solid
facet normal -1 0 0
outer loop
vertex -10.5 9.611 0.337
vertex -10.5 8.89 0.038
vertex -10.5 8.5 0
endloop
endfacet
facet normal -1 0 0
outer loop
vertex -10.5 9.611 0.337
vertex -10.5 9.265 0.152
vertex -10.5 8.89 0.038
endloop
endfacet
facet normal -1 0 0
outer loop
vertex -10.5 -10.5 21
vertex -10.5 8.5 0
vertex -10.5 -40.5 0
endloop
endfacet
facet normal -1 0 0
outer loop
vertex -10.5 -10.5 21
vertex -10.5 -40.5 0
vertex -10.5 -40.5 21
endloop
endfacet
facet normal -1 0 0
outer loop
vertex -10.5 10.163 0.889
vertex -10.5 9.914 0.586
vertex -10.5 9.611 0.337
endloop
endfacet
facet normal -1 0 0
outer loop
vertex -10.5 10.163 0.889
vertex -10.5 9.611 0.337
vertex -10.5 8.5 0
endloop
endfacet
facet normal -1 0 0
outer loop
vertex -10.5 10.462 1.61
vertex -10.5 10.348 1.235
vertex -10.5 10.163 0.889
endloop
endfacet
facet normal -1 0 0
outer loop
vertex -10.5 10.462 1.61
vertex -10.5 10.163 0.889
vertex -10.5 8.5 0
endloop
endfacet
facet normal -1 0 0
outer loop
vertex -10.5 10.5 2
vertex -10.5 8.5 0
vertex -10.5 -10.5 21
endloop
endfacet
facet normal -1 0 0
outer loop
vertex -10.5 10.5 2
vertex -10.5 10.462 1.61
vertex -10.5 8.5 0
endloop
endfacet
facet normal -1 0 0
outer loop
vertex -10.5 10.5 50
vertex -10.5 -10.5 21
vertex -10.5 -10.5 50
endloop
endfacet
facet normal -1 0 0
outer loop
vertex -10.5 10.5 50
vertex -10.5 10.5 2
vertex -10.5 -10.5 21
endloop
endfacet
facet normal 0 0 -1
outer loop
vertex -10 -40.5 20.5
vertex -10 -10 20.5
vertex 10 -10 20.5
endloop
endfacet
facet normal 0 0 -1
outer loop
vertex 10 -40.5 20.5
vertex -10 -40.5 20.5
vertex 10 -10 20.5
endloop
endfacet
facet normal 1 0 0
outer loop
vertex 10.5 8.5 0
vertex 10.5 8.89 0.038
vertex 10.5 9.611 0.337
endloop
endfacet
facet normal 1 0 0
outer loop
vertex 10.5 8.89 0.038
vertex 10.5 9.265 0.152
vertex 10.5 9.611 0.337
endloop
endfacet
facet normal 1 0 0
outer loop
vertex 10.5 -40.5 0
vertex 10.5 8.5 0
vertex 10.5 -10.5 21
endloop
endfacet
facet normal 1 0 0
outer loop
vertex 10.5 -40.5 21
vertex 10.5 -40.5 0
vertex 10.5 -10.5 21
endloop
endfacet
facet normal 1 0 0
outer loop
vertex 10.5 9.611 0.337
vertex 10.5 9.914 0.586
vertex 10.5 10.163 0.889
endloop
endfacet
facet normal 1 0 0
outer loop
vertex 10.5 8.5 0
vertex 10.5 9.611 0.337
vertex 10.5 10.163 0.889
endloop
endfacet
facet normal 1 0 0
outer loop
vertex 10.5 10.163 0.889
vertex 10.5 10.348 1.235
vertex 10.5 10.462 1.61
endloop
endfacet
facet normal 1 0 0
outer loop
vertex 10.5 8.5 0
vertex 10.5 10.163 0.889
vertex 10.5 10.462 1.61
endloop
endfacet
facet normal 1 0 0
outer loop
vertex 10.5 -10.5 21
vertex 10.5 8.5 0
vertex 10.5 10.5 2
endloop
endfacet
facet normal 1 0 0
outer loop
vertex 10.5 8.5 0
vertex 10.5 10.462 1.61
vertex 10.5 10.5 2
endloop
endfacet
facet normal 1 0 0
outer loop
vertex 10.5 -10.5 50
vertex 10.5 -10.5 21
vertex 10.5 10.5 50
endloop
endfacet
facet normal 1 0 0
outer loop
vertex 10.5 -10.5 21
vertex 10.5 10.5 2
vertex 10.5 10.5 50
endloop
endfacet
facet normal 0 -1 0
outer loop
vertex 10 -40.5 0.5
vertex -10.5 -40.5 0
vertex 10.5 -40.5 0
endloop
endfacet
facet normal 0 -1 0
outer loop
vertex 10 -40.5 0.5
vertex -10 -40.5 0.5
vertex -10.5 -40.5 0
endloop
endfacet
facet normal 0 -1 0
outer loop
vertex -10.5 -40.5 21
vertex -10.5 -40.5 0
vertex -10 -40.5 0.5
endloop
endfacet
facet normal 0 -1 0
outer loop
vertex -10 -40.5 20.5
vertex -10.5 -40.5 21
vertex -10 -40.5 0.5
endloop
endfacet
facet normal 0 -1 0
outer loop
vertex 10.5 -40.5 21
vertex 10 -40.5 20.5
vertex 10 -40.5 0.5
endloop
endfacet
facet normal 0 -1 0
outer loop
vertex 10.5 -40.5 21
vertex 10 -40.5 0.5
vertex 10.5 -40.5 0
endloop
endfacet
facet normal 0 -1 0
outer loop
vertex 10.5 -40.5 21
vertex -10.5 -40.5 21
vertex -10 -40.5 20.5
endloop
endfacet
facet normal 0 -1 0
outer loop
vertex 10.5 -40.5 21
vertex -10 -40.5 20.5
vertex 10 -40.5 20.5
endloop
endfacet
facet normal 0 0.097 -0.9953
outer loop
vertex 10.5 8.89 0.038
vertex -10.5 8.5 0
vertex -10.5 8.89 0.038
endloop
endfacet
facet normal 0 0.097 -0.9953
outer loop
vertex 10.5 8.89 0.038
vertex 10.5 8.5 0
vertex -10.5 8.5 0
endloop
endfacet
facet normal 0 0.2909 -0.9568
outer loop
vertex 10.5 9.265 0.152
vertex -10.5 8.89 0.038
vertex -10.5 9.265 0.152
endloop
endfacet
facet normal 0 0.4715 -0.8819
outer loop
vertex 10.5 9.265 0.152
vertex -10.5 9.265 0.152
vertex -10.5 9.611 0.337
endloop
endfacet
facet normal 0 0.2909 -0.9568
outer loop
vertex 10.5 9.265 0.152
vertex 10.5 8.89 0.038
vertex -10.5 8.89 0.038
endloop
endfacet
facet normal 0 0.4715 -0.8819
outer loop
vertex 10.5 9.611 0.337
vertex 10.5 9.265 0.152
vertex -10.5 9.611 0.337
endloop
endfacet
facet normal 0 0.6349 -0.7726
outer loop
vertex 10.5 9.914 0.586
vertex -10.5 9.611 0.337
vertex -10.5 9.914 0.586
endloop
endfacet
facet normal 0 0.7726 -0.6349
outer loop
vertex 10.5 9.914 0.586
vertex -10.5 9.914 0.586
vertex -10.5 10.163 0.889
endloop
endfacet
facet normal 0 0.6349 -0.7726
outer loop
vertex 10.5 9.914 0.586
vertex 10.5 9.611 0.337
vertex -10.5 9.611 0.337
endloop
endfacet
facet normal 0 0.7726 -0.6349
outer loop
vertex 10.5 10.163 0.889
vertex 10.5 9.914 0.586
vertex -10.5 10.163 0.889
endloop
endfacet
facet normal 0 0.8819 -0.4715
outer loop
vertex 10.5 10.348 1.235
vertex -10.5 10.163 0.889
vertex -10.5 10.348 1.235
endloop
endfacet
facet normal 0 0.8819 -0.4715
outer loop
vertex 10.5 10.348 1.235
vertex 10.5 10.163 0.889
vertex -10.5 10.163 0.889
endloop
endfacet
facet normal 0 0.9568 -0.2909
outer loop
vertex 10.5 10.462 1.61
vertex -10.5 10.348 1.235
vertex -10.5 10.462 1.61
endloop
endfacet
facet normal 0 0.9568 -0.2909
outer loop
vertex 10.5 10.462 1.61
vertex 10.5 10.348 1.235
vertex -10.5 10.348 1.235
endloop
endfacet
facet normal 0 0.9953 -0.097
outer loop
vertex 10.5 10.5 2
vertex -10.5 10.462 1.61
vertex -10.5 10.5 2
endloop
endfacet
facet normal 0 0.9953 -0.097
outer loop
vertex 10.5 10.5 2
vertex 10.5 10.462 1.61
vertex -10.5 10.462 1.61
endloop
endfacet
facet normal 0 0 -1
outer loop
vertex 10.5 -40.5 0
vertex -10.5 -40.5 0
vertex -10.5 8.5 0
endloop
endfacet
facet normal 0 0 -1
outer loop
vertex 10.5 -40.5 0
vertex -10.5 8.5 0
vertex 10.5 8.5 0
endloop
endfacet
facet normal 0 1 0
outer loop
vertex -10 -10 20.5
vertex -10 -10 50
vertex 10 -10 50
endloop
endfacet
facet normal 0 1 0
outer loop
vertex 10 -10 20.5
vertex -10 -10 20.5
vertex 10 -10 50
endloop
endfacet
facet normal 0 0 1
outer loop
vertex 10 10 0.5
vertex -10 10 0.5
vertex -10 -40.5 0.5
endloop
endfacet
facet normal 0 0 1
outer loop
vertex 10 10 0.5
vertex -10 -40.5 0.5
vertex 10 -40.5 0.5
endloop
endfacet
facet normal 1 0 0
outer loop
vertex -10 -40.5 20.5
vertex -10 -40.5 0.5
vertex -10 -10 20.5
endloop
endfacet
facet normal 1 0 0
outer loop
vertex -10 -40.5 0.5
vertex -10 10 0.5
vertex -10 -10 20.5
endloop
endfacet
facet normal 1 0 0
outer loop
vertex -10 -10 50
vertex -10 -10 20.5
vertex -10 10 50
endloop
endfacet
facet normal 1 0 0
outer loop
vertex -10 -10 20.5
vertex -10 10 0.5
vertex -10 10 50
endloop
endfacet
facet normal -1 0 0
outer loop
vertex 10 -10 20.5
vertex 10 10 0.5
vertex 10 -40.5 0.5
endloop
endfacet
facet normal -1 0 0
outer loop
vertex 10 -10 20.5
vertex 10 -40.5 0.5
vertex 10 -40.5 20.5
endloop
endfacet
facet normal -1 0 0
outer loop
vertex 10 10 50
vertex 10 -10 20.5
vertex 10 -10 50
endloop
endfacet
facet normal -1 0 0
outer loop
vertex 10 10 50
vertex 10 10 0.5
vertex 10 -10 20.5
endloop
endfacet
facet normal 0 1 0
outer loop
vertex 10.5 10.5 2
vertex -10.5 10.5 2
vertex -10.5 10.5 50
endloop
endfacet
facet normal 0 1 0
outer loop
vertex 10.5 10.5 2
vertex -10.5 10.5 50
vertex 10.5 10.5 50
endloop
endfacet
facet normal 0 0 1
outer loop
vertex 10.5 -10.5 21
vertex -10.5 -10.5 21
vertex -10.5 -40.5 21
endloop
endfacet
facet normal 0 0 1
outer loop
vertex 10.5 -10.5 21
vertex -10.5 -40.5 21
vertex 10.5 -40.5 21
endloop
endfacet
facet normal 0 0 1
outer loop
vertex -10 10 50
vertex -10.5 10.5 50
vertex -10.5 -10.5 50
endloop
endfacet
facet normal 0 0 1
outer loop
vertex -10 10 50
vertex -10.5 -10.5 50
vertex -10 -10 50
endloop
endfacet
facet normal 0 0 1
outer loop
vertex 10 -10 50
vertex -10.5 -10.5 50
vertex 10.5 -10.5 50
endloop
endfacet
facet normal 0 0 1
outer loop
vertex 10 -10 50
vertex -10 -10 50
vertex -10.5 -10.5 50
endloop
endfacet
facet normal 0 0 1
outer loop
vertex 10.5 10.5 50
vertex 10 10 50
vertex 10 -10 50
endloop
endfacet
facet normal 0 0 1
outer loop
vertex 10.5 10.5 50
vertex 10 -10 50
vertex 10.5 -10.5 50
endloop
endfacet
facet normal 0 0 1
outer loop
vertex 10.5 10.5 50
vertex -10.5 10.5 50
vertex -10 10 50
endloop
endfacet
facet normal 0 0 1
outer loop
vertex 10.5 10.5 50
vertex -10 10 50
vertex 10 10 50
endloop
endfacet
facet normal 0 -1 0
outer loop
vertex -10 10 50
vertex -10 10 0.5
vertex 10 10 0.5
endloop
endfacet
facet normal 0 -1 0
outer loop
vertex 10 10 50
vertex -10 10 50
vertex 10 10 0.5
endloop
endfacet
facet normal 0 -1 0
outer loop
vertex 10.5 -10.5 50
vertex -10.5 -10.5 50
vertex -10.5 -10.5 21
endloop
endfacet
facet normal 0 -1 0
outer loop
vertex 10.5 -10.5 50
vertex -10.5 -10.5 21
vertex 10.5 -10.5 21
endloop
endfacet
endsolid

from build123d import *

# Parameters (mm, degrees)
ESQUISSE1_W        = 21
ESQUISSE1_H        = 21
BOSS_EXTRU_1_DEPTH = 50
ESQUISSE3_W        = 21
ESQUISSE3_H        = 21
BOSS_EXTRU_2_DEPTH = 30
COQUE1_T           = -0.5
CONG_1_R           = 2


with BuildPart() as part:
    # Esquisse1 → Boss.-Extru.1 (new body)
    with BuildSketch(Plane.XY):
        Rectangle(ESQUISSE1_W, ESQUISSE1_H)
    extrude(amount=BOSS_EXTRU_1_DEPTH)

    # Esquisse3 → Boss.-Extru.2 (add)
    with BuildSketch(Plane.XZ.offset(10.5)):
        with Locations((0, 10.5)):
            Rectangle(ESQUISSE3_W, ESQUISSE3_H)
    extrude(amount=BOSS_EXTRU_2_DEPTH)

    # Coque1
    coque1_openings = [part.faces().sort_by_distance(p)[0] for p in [
        (0, 0, 50),
        (0, -40.5, 10.5),
    ]]
    offset(amount=COQUE1_T, openings=coque1_openings, kind=Kind.INTERSECTION)

    # Congé1
    cong_1_edges = [part.edges().sort_by_distance(p)[0] for p in [
        (0, 10.5, 0),
    ]]
    fillet(cong_1_edges, radius=CONG_1_R)


solid = part.part
